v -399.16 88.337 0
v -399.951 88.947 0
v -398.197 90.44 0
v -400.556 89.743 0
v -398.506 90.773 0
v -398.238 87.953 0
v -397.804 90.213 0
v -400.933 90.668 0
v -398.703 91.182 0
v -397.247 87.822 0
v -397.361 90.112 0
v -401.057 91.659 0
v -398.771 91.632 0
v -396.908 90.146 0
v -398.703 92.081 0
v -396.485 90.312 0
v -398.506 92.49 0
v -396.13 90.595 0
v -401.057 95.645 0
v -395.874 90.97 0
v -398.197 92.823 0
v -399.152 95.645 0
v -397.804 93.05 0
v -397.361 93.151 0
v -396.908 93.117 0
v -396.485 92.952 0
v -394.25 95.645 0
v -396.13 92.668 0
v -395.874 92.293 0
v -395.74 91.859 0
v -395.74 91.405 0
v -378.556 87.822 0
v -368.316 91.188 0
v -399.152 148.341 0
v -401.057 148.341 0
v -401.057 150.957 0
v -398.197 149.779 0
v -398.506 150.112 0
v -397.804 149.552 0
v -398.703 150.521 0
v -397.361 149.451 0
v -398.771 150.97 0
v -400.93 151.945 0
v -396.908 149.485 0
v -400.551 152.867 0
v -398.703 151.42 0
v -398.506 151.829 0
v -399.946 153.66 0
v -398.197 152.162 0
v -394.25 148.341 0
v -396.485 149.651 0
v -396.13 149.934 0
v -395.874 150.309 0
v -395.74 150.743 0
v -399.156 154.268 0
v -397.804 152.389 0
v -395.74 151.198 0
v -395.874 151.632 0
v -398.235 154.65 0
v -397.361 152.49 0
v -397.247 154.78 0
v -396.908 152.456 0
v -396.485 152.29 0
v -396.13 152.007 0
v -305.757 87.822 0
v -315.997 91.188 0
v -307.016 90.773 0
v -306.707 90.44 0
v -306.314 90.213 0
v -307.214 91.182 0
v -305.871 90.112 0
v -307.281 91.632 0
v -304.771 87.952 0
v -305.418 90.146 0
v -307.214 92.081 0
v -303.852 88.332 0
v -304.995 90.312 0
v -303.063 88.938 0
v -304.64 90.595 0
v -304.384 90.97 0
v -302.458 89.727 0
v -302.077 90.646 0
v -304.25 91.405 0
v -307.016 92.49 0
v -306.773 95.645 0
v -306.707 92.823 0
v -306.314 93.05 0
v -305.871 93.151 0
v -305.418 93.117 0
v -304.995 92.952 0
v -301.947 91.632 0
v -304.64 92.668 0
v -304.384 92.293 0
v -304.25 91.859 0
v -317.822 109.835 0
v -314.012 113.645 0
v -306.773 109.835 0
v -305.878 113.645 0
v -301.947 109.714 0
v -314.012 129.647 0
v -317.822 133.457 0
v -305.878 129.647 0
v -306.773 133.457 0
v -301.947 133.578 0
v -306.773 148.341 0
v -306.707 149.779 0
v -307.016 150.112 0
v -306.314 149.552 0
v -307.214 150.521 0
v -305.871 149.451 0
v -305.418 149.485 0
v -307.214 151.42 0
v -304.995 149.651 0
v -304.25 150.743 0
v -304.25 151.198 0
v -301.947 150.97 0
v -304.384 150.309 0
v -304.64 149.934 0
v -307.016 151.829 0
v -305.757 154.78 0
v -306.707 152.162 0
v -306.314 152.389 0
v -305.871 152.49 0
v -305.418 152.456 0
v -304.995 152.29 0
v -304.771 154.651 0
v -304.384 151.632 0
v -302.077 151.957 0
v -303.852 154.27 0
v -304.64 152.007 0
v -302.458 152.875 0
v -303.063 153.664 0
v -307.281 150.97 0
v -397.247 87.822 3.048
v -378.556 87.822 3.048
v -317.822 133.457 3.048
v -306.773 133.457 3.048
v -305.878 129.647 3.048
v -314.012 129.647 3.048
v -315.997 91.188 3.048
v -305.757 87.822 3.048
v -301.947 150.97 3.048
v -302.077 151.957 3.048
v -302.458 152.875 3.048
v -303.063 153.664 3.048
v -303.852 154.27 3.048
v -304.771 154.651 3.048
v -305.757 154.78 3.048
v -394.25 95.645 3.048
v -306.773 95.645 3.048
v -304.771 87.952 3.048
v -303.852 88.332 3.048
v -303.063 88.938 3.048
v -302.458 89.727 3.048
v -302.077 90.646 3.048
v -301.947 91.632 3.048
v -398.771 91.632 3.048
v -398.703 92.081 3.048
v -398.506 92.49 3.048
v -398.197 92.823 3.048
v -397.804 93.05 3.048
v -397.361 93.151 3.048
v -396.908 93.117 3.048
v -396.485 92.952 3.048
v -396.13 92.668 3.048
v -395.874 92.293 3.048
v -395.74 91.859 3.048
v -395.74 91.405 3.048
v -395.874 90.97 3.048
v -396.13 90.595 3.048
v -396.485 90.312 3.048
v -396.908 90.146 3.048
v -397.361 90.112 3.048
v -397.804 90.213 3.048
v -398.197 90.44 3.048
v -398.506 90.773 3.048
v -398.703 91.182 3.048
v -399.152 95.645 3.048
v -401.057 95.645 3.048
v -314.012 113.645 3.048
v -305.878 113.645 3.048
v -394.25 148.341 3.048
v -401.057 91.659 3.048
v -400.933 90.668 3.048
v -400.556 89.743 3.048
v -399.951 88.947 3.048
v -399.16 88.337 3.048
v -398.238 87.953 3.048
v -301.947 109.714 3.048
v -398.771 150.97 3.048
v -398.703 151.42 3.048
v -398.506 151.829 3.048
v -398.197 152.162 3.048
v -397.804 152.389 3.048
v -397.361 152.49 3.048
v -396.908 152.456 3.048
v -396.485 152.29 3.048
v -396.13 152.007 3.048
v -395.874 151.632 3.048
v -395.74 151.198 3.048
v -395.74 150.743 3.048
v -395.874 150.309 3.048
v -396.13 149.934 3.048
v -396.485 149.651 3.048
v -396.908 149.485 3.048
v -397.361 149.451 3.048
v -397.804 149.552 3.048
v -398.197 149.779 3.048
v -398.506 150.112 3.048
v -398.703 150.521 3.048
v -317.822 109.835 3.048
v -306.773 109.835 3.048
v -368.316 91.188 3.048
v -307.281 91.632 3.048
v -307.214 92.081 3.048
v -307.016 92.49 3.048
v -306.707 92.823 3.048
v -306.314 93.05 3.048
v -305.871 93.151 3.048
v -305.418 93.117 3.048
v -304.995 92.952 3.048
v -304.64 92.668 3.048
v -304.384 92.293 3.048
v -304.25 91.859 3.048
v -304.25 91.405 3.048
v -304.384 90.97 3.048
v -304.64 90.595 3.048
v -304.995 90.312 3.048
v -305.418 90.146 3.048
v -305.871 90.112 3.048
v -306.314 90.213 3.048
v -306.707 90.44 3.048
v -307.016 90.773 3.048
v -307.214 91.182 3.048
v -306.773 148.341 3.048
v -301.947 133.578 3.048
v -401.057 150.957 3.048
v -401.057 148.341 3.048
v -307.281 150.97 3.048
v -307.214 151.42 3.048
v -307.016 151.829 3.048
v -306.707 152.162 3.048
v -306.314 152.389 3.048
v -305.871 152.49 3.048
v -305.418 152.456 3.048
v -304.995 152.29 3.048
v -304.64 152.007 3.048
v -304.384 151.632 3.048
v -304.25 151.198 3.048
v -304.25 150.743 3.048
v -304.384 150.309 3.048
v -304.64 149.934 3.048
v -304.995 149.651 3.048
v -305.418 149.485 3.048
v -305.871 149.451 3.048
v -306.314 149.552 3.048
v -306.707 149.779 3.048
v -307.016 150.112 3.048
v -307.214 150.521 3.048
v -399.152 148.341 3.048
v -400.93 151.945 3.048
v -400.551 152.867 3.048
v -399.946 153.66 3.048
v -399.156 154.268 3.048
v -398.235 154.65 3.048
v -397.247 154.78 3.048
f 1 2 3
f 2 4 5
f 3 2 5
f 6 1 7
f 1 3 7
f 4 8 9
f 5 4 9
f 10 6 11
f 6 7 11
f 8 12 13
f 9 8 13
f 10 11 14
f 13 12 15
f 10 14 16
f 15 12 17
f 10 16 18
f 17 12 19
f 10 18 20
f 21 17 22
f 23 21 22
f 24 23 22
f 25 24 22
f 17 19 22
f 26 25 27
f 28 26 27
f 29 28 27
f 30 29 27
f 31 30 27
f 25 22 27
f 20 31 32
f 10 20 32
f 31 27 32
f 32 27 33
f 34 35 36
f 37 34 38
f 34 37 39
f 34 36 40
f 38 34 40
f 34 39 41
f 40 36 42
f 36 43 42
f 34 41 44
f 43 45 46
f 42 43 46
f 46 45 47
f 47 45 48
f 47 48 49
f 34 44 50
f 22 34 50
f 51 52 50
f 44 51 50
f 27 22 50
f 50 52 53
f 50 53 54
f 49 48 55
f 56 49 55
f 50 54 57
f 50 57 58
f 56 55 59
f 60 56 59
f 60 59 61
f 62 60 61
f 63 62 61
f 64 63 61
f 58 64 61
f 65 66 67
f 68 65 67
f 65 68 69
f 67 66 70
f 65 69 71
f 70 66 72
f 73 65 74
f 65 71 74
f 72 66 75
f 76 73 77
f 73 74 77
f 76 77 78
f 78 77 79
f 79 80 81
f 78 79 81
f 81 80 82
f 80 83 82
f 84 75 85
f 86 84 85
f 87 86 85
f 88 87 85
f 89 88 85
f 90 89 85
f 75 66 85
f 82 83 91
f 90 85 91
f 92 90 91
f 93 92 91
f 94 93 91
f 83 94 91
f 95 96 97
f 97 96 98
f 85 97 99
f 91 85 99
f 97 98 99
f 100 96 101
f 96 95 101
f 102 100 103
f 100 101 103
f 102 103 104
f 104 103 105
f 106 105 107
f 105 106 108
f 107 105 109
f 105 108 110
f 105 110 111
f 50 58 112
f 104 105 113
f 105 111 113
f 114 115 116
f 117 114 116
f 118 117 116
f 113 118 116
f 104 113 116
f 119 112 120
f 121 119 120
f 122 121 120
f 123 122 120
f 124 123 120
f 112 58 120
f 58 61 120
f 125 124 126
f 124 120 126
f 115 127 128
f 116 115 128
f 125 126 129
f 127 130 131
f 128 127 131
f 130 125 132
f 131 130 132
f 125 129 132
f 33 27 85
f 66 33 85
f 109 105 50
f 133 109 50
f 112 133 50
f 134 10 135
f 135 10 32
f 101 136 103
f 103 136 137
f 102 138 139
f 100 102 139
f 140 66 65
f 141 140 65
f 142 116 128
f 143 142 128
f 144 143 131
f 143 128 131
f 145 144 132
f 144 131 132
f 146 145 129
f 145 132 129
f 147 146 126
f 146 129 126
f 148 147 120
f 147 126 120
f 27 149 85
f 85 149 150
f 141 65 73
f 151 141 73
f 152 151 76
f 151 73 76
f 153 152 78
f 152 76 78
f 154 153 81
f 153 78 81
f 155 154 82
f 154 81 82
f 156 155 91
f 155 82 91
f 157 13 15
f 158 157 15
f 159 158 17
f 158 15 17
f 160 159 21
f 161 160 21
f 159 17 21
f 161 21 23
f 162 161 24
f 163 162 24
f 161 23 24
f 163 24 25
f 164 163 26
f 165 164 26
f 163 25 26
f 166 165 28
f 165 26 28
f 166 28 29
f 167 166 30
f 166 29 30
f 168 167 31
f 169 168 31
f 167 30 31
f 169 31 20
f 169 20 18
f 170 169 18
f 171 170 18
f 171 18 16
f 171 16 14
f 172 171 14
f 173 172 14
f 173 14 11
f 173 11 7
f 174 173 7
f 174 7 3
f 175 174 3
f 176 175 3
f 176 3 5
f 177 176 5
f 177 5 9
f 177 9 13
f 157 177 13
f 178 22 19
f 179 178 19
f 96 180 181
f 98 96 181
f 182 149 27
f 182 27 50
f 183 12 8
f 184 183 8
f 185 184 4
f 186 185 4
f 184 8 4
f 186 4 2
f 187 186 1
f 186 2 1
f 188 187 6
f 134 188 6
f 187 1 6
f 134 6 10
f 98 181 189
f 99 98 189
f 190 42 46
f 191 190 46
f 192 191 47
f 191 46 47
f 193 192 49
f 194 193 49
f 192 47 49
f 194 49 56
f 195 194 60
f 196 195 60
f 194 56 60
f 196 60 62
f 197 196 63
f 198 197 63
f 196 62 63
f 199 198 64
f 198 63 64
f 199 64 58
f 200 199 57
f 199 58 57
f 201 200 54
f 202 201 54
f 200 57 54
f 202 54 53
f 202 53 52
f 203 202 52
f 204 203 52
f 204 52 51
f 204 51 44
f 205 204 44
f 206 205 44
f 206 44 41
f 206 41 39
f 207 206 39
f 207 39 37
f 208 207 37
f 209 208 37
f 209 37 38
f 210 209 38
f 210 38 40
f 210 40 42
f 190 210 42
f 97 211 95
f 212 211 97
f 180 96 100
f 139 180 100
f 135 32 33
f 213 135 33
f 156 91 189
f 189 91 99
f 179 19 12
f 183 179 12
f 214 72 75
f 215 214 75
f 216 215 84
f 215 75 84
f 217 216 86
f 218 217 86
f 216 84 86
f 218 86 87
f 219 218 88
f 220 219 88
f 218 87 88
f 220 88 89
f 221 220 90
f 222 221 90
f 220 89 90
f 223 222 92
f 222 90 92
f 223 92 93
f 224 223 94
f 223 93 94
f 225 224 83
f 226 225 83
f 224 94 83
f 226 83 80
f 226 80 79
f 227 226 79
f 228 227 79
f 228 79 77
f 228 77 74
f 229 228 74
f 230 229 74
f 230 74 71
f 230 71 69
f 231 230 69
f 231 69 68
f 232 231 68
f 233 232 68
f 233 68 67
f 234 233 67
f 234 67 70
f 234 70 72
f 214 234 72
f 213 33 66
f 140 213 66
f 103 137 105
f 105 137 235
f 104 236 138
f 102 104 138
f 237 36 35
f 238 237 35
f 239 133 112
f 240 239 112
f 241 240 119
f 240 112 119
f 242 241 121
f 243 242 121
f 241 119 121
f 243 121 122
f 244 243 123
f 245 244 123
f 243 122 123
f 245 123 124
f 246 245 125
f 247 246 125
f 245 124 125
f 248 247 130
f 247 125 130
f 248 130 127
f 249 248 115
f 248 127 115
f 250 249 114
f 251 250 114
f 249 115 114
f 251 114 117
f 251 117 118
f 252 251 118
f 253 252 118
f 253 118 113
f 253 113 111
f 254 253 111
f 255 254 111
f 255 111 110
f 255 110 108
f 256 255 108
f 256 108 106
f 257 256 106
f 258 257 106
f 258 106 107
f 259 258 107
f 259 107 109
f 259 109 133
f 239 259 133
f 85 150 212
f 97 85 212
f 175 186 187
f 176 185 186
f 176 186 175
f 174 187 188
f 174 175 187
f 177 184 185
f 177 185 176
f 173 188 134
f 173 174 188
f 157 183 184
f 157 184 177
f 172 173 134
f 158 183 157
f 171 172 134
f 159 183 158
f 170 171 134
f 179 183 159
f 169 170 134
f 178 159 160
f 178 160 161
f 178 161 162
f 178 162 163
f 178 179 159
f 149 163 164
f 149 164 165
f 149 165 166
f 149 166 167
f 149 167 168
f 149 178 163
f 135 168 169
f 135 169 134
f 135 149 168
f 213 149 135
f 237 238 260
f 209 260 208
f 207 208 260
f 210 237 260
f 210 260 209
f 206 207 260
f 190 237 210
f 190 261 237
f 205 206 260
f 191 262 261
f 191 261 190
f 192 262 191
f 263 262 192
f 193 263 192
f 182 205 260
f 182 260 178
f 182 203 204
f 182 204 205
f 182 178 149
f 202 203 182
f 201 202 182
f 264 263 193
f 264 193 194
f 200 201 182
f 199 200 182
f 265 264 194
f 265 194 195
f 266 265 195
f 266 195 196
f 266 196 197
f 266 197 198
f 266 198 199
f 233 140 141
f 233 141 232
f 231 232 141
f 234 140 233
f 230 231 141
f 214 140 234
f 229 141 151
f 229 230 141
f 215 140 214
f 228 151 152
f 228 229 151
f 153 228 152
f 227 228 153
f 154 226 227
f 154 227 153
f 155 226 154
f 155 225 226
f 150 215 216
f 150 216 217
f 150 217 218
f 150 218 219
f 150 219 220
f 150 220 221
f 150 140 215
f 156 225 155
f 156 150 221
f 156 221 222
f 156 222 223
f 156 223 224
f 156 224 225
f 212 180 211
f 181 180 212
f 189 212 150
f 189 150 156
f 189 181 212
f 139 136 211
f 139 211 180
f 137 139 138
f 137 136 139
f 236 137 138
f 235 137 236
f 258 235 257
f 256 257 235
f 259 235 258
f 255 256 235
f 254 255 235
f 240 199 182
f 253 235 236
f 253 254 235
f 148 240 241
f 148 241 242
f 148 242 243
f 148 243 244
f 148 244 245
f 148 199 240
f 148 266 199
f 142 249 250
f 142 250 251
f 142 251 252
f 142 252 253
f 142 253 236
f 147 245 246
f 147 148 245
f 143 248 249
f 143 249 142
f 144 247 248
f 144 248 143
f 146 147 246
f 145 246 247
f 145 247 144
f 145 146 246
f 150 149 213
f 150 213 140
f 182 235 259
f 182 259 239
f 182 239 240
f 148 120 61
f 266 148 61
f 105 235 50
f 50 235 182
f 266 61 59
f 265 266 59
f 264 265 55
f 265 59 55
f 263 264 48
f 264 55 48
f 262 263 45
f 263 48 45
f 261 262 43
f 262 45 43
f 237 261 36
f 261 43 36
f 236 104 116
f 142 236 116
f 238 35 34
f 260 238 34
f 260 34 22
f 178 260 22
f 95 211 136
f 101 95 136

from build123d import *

# Parameters (mm, degrees)
BOSS_EXTRUDE1_DEPTH = 3.048
SKETCH2_R           = 1.355900406
CUT_EXTRUDE1_DEPTH  = 4.048
SKETCH3_R           = 1.524
CUT_EXTRUDE2_DEPTH  = 4.048
CUT_EXTRUDE3_DEPTH  = 4.048
BOSS_EXTRUDE2_DEPTH = 3.048
SKETCH5_W           = 11.049
SKETCH5_H           = 14.8839
SKETCH5_W_2         = 76.4276
SKETCH5_H_2         = 52.6961
SKETCH5_H_3         = 14.1902
CUT_EXTRUDE4_DEPTH  = 4.048


with BuildPart() as part:
    # Sketch1 → Boss-Extrude1 (new body)
    with BuildSketch(Plane.XY):
        with BuildLine():
            Line((-309.8086, 128.8851), (-305.87795, 128.8851))
            Line((-305.87795, 128.8851), (-301.9473, 132.81575))
            Line((-301.9473, 132.81575), (-301.9473, 150.9704))
            ThreePointArc((-301.9473, 150.9704), (-303.063223164, 153.664476836), (-305.7573, 154.7804))
            Line((-305.7573, 154.7804), (-397.247125, 154.7804))
            ThreePointArc((-397.247125, 154.7804), (-399.946077222, 153.659592612), (-401.0571, 150.956597849))
            Line((-401.0571, 150.956597849), (-401.0571, 148.341))
            Line((-401.0571, 148.341), (-399.1521, 148.341))
            Line((-399.1521, 148.341), (-399.1521, 95.6449))
            Line((-399.1521, 95.6449), (-401.0571, 95.6449))
            Line((-401.0571, 95.6449), (-401.0571, 91.659304166))
            ThreePointArc((-401.0571, 91.659304166), (-399.951018769, 88.947400452), (-397.2472, 87.8217))
            Line((-397.2472, 87.8217), (-378.5565, 87.8217))
            Line((-378.5565, 87.8217), (-368.3165, 91.1883))
            Line((-368.3165, 91.1883), (-315.9973, 91.1883))
            Line((-315.9973, 91.1883), (-305.7573, 87.8217))
            ThreePointArc((-305.7573, 87.8217), (-303.063223164, 88.937623164), (-301.9473, 91.6317))
            Line((-301.9473, 91.6317), (-301.9473, 111.74645))
            Line((-301.9473, 111.74645), (-305.87795, 115.6771))
            Line((-305.87795, 115.6771), (-309.8086, 115.6771))
            Line((-309.8086, 115.6771), (-314.0123, 115.6771))
            Line((-314.0123, 115.6771), (-314.0123, 128.8851))
            Line((-314.0123, 128.8851), (-309.8086, 128.8851))
        make_face()
        Polygon((-395.3675, 92.9525), (-395.3675, 149.2432), (-309.8086, 149.2432), (-309.8086, 132.81575), (-318.2033, 132.81575), (-318.2033, 111.74645), (-309.8086, 111.74645), (-309.8086, 92.9525), align=None, mode=Mode.SUBTRACT)
    extrude(amount=BOSS_EXTRUDE1_DEPTH)

    # Sketch2 → Cut-Extrude1 (cut, through all)
    with BuildSketch(Plane(origin=(0, 0, 0), x_dir=(-1, 0, 0), z_dir=(0, 0, -1))):
        with Locations((305.7573, 150.9704)):
            Circle(SKETCH2_R)
        with Locations((397.247125, 150.9704)):
            Circle(SKETCH2_R)
        with Locations((397.2472, 91.6317)):
            Circle(SKETCH2_R)
        with Locations((305.7573, 91.6317)):
            Circle(SKETCH2_R)
    extrude(amount=-CUT_EXTRUDE1_DEPTH, mode=Mode.SUBTRACT)

    # Sketch3 → Cut-Extrude2 (cut, through all)
    with BuildSketch(Plane(origin=(0, 0, 0), x_dir=(-1, 0, 0), z_dir=(0, 0, -1))):
        with Locations((305.7573, 150.9704)):
            Circle(SKETCH3_R)
        with Locations((397.247125, 150.9704)):
            Circle(SKETCH3_R)
        with Locations((397.2472, 91.6317)):
            Circle(SKETCH3_R)
        with Locations((305.7573, 91.6317)):
            Circle(SKETCH3_R)
    extrude(amount=-CUT_EXTRUDE2_DEPTH, mode=Mode.SUBTRACT)

    # Sketch4 → Cut-Extrude3 (cut, through all)
    with BuildSketch(Plane.XY.offset(3.048)):
        Polygon((-301.9473, 133.57775), (-305.87795, 129.6471), (-314.0123, 129.6471), (-314.0123, 113.6451), (-305.87795, 113.6451), (-301.9473, 109.71445), align=None)
    extrude(amount=-CUT_EXTRUDE3_DEPTH, mode=Mode.SUBTRACT)

    # Sketch4_4 → Boss-Extrude2 (add)
    with BuildSketch(Plane.XY.offset(3.048)):
        Polygon((-318.2033, 111.74645), (-318.2033, 132.81575), (-309.8086, 132.81575), (-309.8086, 149.2432), (-395.3675, 149.2432), (-395.3675, 92.9525), (-309.8086, 92.9525), (-309.8086, 111.74645), align=None)
    extrude(amount=-BOSS_EXTRUDE2_DEPTH)

    # Sketch5 → Cut-Extrude4 (cut, through all)
    with BuildSketch(Plane.XY.offset(3.048)):
        with Locations((-312.2978, 140.89905)):
            Rectangle(SKETCH5_W, SKETCH5_H)
        with Locations((-356.0361, 121.99295)):
            Rectangle(SKETCH5_W_2, SKETCH5_H_2)
        with Locations((-312.2978, 102.74)):
            Rectangle(SKETCH5_W, SKETCH5_H_3)
    extrude(amount=-CUT_EXTRUDE4_DEPTH, mode=Mode.SUBTRACT)


solid = part.part
